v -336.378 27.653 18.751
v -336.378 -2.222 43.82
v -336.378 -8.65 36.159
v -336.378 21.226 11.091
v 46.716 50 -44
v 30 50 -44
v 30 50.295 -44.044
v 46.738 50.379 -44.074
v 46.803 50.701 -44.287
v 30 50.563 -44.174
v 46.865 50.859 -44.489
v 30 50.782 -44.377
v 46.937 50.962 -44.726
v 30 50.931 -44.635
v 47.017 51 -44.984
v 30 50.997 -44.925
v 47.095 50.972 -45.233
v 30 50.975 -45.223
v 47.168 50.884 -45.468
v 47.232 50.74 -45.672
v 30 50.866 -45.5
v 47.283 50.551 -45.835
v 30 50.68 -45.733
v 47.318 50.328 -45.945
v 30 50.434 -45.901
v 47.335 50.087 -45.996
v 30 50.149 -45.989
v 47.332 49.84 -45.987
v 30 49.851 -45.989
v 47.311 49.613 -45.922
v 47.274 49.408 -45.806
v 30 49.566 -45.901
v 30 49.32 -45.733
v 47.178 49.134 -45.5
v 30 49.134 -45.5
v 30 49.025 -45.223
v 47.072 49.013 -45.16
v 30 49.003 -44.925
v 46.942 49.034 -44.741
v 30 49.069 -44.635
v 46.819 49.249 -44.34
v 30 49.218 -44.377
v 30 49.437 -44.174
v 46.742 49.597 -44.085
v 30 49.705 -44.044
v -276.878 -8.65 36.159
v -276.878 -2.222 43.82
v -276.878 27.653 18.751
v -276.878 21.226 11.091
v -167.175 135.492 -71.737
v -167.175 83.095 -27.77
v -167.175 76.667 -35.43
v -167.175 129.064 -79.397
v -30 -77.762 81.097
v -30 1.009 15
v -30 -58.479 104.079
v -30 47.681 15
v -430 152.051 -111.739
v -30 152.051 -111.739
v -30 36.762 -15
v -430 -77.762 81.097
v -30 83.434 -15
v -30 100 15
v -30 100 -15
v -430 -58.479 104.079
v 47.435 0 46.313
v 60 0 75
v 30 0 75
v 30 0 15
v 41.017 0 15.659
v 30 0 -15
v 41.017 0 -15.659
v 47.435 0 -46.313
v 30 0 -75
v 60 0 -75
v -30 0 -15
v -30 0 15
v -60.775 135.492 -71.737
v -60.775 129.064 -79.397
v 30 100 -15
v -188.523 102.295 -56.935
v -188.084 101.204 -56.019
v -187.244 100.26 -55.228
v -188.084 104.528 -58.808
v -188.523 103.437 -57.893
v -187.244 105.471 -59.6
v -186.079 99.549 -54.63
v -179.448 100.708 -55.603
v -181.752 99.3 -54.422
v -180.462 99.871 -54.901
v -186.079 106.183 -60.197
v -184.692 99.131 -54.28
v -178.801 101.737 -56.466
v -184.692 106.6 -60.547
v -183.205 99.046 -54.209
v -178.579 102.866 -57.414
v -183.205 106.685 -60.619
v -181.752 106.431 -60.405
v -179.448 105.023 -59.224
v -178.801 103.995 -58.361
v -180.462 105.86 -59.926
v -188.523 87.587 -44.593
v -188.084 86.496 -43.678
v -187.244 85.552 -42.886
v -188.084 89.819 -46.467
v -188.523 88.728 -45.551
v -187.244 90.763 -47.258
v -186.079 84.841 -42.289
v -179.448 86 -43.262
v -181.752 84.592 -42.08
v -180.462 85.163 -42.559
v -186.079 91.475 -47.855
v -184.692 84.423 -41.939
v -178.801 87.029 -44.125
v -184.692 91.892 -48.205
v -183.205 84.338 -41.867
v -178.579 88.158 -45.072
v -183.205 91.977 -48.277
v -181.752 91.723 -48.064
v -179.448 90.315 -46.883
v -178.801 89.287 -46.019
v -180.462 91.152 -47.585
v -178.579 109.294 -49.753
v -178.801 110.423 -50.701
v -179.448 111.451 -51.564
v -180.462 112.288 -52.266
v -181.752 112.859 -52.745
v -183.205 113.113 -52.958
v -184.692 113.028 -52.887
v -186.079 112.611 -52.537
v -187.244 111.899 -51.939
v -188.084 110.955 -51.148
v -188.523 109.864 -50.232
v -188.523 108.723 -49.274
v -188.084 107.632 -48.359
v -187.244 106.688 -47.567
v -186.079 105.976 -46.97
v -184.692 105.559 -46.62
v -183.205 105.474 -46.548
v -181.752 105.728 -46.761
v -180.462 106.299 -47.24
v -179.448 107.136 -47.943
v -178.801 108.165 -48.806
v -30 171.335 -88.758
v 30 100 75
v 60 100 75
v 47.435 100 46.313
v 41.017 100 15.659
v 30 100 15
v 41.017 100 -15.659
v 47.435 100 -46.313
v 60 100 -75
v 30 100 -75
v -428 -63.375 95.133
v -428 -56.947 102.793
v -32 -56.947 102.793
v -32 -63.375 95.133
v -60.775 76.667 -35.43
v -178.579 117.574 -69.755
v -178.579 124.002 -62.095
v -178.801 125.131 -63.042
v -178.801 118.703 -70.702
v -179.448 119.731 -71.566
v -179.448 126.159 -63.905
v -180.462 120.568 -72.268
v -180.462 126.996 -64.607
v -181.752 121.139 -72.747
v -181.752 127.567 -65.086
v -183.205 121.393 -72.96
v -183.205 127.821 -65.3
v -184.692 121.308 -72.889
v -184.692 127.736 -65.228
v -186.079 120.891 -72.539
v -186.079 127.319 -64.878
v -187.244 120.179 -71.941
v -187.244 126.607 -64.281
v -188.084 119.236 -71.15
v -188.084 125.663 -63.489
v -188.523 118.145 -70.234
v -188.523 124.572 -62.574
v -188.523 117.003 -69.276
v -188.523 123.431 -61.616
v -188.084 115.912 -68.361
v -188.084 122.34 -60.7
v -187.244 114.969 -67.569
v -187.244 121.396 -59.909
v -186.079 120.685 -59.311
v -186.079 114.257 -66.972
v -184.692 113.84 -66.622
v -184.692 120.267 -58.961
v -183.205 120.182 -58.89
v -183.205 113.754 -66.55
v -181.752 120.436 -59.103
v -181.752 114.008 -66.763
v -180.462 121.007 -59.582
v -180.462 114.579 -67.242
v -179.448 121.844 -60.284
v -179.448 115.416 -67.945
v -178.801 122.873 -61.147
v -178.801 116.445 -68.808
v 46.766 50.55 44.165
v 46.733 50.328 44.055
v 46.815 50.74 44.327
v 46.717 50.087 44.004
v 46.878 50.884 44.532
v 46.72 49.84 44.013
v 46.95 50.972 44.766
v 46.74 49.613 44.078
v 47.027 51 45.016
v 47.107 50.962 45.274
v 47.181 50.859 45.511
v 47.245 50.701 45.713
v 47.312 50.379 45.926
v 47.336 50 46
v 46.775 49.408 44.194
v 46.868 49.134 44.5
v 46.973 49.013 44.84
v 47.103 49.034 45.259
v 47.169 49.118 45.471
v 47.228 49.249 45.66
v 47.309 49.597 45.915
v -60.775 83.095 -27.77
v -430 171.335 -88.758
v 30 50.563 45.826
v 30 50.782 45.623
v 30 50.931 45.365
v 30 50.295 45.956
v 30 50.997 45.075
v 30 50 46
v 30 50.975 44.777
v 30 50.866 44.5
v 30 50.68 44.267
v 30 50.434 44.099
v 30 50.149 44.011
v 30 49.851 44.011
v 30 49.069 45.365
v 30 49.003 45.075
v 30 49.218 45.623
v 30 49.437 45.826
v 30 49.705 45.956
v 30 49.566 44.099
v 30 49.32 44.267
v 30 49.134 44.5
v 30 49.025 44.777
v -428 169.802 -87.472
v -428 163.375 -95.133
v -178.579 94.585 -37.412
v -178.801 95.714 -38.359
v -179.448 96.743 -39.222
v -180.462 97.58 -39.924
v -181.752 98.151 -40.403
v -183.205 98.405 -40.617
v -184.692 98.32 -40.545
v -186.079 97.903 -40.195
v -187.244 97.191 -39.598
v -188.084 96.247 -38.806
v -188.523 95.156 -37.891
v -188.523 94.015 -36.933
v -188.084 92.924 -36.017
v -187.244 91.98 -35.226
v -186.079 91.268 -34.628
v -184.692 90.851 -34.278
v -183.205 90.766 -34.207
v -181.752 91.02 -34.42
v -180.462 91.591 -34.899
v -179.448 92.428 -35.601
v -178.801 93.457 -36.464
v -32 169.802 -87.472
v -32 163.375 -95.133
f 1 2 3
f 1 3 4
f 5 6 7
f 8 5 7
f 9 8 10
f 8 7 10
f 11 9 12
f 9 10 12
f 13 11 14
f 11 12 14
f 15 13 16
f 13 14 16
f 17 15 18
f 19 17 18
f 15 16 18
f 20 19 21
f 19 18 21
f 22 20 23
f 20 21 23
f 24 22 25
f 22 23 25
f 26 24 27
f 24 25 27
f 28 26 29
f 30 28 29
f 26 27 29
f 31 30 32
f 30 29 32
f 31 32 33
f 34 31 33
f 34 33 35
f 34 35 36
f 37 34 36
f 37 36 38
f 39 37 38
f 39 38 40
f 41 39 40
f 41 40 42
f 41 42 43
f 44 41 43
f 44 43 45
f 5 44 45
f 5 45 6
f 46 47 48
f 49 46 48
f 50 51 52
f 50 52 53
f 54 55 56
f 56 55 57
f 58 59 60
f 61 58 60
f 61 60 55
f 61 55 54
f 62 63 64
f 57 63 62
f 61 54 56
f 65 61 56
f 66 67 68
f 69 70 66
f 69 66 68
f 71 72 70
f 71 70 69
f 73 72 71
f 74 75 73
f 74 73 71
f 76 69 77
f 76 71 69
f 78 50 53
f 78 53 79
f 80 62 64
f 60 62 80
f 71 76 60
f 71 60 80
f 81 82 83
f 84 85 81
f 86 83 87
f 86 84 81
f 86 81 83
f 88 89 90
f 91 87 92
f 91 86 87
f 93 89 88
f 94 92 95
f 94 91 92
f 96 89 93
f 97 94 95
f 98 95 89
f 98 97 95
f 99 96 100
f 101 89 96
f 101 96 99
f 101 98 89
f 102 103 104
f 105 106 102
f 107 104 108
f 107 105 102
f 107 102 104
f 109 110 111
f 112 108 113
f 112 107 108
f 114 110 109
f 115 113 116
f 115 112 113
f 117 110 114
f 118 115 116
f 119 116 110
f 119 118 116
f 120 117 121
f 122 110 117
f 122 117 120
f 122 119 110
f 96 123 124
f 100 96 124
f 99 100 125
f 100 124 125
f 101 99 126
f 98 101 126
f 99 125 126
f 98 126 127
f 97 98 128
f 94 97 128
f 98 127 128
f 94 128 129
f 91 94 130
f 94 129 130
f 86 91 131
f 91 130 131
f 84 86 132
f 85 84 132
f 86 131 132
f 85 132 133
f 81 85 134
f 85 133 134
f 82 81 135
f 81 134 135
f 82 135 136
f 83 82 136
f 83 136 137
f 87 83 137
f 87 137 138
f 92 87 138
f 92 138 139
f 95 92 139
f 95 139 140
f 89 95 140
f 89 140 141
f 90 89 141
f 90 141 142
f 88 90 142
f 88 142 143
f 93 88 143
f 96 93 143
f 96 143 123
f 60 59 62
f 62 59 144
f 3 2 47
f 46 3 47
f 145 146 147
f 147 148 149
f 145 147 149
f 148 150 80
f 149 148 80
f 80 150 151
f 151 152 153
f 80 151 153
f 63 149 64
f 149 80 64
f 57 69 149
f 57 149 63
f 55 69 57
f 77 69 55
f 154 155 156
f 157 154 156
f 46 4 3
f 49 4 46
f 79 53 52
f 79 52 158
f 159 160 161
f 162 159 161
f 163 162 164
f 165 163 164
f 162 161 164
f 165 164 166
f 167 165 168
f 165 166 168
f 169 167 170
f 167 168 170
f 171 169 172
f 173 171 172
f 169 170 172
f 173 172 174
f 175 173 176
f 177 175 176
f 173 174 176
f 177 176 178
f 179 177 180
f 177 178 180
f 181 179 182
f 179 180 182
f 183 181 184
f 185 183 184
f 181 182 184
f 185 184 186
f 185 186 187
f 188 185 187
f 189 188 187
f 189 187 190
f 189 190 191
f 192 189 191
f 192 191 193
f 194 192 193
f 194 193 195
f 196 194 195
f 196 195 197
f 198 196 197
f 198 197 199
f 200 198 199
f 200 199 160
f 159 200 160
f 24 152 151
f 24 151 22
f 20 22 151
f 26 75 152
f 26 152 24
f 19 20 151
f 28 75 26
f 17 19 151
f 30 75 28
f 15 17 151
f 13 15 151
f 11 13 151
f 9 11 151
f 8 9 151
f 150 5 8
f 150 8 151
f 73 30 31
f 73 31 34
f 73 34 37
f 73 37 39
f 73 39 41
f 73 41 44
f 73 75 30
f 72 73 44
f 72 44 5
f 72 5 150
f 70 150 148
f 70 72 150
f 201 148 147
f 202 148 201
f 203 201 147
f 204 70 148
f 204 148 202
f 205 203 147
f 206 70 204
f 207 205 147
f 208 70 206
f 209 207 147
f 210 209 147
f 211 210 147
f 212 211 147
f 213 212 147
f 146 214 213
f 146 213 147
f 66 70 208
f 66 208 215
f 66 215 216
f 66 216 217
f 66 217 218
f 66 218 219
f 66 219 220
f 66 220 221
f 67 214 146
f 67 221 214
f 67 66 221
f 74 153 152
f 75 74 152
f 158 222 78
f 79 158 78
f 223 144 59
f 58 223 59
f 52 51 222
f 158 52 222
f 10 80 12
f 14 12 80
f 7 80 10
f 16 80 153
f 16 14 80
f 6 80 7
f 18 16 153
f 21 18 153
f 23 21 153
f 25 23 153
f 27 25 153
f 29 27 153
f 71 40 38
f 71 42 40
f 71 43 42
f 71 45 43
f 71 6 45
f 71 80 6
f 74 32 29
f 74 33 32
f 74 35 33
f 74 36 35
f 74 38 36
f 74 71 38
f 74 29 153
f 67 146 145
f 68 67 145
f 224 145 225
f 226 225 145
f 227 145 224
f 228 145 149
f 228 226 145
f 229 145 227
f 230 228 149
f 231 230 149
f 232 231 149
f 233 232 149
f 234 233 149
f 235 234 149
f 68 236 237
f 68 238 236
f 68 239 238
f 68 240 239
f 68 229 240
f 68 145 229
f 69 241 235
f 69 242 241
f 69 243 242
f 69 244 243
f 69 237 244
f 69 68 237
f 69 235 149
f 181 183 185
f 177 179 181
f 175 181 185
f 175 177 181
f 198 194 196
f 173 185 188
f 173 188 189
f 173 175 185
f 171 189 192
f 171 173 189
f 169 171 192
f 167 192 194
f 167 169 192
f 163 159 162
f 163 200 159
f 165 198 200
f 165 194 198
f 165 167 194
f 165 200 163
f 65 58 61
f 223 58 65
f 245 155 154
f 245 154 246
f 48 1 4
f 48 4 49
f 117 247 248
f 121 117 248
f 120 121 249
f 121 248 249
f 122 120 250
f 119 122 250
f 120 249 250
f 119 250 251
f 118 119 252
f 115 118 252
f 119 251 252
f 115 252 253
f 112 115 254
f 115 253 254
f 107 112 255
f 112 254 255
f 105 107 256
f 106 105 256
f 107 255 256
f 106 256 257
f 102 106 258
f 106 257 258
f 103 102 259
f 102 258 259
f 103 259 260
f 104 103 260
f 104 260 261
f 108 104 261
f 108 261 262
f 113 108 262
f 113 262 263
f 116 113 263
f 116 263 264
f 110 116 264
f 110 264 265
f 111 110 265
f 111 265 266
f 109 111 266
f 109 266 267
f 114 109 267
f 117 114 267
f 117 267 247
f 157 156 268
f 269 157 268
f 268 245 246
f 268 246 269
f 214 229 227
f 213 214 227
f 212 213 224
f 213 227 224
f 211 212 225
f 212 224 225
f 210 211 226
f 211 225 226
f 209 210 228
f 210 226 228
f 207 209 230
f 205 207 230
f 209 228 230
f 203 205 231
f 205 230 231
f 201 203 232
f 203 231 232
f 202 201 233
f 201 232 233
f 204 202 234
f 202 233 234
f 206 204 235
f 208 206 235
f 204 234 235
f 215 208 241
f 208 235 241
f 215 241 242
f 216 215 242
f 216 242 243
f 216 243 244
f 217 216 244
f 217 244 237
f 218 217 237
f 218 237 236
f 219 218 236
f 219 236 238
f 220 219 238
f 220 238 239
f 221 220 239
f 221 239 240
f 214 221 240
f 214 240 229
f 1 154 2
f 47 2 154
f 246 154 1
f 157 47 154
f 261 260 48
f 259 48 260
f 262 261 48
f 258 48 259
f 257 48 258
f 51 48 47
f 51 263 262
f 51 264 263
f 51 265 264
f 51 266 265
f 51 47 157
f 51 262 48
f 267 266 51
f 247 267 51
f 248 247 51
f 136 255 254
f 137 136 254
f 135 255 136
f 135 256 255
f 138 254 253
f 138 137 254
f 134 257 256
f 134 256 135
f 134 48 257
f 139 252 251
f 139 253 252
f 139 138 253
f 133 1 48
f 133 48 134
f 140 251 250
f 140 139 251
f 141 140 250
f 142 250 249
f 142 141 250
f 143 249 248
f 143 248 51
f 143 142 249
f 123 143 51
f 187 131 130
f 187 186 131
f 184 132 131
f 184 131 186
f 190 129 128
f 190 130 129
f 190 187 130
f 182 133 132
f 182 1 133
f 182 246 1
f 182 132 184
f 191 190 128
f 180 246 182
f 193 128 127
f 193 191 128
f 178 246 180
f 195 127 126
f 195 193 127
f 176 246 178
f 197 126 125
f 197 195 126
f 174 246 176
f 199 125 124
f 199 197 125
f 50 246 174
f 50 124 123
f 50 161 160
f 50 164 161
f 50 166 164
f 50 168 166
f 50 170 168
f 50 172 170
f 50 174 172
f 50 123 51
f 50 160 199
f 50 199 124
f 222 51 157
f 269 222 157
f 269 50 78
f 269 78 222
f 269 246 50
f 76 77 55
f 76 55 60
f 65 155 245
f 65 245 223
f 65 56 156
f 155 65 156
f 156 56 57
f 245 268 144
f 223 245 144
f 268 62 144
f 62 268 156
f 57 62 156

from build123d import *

# Parameters (mm, degrees)
BOSS_EXTRU_1_DEPTH      = 100
BOSS_EXTRU_2_DEPTH      = 400
ESQUISSE3_W             = 396
ESQUISSE3_H             = 296
ESQUISSE3_W_2           = 59.5
ESQUISSE3_H_2           = 39
ESQUISSE3_R             = 5
ESQUISSE3_W_3           = 106.4
ESQUISSE3_H_3           = 68.4
ENL_V_MAT_EXTRU_1_DEPTH = 10
ESQUISSE3_3_W           = 106.4
ESQUISSE3_3_H           = 68.4
ESQUISSE3_3_W_2         = 59.5
ESQUISSE3_3_H_2         = 39
ESQUISSE3_3_R           = 5
ENL_V_MAT_EXTRU_2_DEPTH = 20
ESQUISSE4_R             = 1
ENL_V_MAT_EXTRU_3_DEPTH = 60


with BuildPart() as part:
    # Esquisse1 → Boss.-Extru.1 (new body)
    with BuildSketch(Plane(origin=(0, 0, 0), x_dir=(1, 0, 0), z_dir=(0, 1, 0))):
        with BuildLine():
            Line((30, 15), (30, 75))
            Line((30, 75), (60, 75))
            ThreePointArc((60, 75), (40.208169188, 0), (60, -75))
            Line((60, -75), (30, -75))
            Line((30, -75), (30, -15))
            Line((30, -15), (-30, -15))
            Line((-30, -15), (-30, 15))
            Line((-30, 15), (30, 15))
        make_face()
    extrude(amount=BOSS_EXTRU_1_DEPTH)

    # Esquisse2 → Boss.-Extru.2 (add)
    with BuildSketch(Plane.ZY.offset(30)):
        Polygon((-111.739030315, 152.050914274), (81.097252591, -77.762418662), (104.078585884, -58.478790371), (-88.757697022, 171.334542565), align=None)
    extrude(amount=BOSS_EXTRU_2_DEPTH)

    # Esquisse3 → Enl_v. mat.-Extru.1 (cut)
    with BuildSketch(Plane(origin=(0, 27.086671655, 32.280638256), x_dir=(1, 0, 0), z_dir=(0, 0.6427876096865351, 0.7660444431189816))):
        with Locations((-230, 38.302222156)):
            Rectangle(ESQUISSE3_W, ESQUISSE3_H)
        with Locations((-306.627943765, -10.369216509)):
            Rectangle(ESQUISSE3_W_2, ESQUISSE3_H_2, mode=Mode.SUBTRACT)
        with Locations((-183.579130296, 96.504442653)):
            Circle(ESQUISSE3_R, mode=Mode.SUBTRACT)
        with Locations((-183.579130296, 115.704442653)):
            Circle(ESQUISSE3_R, mode=Mode.SUBTRACT)
        with Locations((-183.579130296, 134.904442653)):
            Circle(ESQUISSE3_R, mode=Mode.SUBTRACT)
        with Locations((-113.975273558, 115.704442653)):
            Rectangle(ESQUISSE3_W_3, ESQUISSE3_H_3, mode=Mode.SUBTRACT)
    extrude(amount=-ENL_V_MAT_EXTRU_1_DEPTH, mode=Mode.SUBTRACT)

    # Esquisse3_3 → Enl_v. mat.-Extru.2 (cut)
    with BuildSketch(Plane(origin=(0, 27.086671655, 32.280638256), x_dir=(1, 0, 0), z_dir=(0, 0.6427876096865351, 0.7660444431189816))):
        with Locations((-113.975273558, 115.704442653)):
            Rectangle(ESQUISSE3_3_W, ESQUISSE3_3_H)
        with Locations((-306.627943765, -10.369216509)):
            Rectangle(ESQUISSE3_3_W_2, ESQUISSE3_3_H_2)
        with Locations((-183.579130296, 134.904442653)):
            Circle(ESQUISSE3_3_R)
        with Locations((-183.579130296, 115.704442653)):
            Circle(ESQUISSE3_3_R)
        with Locations((-183.579130296, 96.504442653)):
            Circle(ESQUISSE3_3_R)
    extrude(amount=-ENL_V_MAT_EXTRU_2_DEPTH, mode=Mode.SUBTRACT)

    # Esquisse4 → Enl_v. mat.-Extru.3 (cut)
    with BuildSketch(Plane.ZY.offset(-30)):
        with Locations((-45, 50)):
            Circle(ESQUISSE4_R)
        with Locations((45, 50)):
            Circle(ESQUISSE4_R)
    extrude(amount=-ENL_V_MAT_EXTRU_3_DEPTH, mode=Mode.SUBTRACT)


solid = part.part
